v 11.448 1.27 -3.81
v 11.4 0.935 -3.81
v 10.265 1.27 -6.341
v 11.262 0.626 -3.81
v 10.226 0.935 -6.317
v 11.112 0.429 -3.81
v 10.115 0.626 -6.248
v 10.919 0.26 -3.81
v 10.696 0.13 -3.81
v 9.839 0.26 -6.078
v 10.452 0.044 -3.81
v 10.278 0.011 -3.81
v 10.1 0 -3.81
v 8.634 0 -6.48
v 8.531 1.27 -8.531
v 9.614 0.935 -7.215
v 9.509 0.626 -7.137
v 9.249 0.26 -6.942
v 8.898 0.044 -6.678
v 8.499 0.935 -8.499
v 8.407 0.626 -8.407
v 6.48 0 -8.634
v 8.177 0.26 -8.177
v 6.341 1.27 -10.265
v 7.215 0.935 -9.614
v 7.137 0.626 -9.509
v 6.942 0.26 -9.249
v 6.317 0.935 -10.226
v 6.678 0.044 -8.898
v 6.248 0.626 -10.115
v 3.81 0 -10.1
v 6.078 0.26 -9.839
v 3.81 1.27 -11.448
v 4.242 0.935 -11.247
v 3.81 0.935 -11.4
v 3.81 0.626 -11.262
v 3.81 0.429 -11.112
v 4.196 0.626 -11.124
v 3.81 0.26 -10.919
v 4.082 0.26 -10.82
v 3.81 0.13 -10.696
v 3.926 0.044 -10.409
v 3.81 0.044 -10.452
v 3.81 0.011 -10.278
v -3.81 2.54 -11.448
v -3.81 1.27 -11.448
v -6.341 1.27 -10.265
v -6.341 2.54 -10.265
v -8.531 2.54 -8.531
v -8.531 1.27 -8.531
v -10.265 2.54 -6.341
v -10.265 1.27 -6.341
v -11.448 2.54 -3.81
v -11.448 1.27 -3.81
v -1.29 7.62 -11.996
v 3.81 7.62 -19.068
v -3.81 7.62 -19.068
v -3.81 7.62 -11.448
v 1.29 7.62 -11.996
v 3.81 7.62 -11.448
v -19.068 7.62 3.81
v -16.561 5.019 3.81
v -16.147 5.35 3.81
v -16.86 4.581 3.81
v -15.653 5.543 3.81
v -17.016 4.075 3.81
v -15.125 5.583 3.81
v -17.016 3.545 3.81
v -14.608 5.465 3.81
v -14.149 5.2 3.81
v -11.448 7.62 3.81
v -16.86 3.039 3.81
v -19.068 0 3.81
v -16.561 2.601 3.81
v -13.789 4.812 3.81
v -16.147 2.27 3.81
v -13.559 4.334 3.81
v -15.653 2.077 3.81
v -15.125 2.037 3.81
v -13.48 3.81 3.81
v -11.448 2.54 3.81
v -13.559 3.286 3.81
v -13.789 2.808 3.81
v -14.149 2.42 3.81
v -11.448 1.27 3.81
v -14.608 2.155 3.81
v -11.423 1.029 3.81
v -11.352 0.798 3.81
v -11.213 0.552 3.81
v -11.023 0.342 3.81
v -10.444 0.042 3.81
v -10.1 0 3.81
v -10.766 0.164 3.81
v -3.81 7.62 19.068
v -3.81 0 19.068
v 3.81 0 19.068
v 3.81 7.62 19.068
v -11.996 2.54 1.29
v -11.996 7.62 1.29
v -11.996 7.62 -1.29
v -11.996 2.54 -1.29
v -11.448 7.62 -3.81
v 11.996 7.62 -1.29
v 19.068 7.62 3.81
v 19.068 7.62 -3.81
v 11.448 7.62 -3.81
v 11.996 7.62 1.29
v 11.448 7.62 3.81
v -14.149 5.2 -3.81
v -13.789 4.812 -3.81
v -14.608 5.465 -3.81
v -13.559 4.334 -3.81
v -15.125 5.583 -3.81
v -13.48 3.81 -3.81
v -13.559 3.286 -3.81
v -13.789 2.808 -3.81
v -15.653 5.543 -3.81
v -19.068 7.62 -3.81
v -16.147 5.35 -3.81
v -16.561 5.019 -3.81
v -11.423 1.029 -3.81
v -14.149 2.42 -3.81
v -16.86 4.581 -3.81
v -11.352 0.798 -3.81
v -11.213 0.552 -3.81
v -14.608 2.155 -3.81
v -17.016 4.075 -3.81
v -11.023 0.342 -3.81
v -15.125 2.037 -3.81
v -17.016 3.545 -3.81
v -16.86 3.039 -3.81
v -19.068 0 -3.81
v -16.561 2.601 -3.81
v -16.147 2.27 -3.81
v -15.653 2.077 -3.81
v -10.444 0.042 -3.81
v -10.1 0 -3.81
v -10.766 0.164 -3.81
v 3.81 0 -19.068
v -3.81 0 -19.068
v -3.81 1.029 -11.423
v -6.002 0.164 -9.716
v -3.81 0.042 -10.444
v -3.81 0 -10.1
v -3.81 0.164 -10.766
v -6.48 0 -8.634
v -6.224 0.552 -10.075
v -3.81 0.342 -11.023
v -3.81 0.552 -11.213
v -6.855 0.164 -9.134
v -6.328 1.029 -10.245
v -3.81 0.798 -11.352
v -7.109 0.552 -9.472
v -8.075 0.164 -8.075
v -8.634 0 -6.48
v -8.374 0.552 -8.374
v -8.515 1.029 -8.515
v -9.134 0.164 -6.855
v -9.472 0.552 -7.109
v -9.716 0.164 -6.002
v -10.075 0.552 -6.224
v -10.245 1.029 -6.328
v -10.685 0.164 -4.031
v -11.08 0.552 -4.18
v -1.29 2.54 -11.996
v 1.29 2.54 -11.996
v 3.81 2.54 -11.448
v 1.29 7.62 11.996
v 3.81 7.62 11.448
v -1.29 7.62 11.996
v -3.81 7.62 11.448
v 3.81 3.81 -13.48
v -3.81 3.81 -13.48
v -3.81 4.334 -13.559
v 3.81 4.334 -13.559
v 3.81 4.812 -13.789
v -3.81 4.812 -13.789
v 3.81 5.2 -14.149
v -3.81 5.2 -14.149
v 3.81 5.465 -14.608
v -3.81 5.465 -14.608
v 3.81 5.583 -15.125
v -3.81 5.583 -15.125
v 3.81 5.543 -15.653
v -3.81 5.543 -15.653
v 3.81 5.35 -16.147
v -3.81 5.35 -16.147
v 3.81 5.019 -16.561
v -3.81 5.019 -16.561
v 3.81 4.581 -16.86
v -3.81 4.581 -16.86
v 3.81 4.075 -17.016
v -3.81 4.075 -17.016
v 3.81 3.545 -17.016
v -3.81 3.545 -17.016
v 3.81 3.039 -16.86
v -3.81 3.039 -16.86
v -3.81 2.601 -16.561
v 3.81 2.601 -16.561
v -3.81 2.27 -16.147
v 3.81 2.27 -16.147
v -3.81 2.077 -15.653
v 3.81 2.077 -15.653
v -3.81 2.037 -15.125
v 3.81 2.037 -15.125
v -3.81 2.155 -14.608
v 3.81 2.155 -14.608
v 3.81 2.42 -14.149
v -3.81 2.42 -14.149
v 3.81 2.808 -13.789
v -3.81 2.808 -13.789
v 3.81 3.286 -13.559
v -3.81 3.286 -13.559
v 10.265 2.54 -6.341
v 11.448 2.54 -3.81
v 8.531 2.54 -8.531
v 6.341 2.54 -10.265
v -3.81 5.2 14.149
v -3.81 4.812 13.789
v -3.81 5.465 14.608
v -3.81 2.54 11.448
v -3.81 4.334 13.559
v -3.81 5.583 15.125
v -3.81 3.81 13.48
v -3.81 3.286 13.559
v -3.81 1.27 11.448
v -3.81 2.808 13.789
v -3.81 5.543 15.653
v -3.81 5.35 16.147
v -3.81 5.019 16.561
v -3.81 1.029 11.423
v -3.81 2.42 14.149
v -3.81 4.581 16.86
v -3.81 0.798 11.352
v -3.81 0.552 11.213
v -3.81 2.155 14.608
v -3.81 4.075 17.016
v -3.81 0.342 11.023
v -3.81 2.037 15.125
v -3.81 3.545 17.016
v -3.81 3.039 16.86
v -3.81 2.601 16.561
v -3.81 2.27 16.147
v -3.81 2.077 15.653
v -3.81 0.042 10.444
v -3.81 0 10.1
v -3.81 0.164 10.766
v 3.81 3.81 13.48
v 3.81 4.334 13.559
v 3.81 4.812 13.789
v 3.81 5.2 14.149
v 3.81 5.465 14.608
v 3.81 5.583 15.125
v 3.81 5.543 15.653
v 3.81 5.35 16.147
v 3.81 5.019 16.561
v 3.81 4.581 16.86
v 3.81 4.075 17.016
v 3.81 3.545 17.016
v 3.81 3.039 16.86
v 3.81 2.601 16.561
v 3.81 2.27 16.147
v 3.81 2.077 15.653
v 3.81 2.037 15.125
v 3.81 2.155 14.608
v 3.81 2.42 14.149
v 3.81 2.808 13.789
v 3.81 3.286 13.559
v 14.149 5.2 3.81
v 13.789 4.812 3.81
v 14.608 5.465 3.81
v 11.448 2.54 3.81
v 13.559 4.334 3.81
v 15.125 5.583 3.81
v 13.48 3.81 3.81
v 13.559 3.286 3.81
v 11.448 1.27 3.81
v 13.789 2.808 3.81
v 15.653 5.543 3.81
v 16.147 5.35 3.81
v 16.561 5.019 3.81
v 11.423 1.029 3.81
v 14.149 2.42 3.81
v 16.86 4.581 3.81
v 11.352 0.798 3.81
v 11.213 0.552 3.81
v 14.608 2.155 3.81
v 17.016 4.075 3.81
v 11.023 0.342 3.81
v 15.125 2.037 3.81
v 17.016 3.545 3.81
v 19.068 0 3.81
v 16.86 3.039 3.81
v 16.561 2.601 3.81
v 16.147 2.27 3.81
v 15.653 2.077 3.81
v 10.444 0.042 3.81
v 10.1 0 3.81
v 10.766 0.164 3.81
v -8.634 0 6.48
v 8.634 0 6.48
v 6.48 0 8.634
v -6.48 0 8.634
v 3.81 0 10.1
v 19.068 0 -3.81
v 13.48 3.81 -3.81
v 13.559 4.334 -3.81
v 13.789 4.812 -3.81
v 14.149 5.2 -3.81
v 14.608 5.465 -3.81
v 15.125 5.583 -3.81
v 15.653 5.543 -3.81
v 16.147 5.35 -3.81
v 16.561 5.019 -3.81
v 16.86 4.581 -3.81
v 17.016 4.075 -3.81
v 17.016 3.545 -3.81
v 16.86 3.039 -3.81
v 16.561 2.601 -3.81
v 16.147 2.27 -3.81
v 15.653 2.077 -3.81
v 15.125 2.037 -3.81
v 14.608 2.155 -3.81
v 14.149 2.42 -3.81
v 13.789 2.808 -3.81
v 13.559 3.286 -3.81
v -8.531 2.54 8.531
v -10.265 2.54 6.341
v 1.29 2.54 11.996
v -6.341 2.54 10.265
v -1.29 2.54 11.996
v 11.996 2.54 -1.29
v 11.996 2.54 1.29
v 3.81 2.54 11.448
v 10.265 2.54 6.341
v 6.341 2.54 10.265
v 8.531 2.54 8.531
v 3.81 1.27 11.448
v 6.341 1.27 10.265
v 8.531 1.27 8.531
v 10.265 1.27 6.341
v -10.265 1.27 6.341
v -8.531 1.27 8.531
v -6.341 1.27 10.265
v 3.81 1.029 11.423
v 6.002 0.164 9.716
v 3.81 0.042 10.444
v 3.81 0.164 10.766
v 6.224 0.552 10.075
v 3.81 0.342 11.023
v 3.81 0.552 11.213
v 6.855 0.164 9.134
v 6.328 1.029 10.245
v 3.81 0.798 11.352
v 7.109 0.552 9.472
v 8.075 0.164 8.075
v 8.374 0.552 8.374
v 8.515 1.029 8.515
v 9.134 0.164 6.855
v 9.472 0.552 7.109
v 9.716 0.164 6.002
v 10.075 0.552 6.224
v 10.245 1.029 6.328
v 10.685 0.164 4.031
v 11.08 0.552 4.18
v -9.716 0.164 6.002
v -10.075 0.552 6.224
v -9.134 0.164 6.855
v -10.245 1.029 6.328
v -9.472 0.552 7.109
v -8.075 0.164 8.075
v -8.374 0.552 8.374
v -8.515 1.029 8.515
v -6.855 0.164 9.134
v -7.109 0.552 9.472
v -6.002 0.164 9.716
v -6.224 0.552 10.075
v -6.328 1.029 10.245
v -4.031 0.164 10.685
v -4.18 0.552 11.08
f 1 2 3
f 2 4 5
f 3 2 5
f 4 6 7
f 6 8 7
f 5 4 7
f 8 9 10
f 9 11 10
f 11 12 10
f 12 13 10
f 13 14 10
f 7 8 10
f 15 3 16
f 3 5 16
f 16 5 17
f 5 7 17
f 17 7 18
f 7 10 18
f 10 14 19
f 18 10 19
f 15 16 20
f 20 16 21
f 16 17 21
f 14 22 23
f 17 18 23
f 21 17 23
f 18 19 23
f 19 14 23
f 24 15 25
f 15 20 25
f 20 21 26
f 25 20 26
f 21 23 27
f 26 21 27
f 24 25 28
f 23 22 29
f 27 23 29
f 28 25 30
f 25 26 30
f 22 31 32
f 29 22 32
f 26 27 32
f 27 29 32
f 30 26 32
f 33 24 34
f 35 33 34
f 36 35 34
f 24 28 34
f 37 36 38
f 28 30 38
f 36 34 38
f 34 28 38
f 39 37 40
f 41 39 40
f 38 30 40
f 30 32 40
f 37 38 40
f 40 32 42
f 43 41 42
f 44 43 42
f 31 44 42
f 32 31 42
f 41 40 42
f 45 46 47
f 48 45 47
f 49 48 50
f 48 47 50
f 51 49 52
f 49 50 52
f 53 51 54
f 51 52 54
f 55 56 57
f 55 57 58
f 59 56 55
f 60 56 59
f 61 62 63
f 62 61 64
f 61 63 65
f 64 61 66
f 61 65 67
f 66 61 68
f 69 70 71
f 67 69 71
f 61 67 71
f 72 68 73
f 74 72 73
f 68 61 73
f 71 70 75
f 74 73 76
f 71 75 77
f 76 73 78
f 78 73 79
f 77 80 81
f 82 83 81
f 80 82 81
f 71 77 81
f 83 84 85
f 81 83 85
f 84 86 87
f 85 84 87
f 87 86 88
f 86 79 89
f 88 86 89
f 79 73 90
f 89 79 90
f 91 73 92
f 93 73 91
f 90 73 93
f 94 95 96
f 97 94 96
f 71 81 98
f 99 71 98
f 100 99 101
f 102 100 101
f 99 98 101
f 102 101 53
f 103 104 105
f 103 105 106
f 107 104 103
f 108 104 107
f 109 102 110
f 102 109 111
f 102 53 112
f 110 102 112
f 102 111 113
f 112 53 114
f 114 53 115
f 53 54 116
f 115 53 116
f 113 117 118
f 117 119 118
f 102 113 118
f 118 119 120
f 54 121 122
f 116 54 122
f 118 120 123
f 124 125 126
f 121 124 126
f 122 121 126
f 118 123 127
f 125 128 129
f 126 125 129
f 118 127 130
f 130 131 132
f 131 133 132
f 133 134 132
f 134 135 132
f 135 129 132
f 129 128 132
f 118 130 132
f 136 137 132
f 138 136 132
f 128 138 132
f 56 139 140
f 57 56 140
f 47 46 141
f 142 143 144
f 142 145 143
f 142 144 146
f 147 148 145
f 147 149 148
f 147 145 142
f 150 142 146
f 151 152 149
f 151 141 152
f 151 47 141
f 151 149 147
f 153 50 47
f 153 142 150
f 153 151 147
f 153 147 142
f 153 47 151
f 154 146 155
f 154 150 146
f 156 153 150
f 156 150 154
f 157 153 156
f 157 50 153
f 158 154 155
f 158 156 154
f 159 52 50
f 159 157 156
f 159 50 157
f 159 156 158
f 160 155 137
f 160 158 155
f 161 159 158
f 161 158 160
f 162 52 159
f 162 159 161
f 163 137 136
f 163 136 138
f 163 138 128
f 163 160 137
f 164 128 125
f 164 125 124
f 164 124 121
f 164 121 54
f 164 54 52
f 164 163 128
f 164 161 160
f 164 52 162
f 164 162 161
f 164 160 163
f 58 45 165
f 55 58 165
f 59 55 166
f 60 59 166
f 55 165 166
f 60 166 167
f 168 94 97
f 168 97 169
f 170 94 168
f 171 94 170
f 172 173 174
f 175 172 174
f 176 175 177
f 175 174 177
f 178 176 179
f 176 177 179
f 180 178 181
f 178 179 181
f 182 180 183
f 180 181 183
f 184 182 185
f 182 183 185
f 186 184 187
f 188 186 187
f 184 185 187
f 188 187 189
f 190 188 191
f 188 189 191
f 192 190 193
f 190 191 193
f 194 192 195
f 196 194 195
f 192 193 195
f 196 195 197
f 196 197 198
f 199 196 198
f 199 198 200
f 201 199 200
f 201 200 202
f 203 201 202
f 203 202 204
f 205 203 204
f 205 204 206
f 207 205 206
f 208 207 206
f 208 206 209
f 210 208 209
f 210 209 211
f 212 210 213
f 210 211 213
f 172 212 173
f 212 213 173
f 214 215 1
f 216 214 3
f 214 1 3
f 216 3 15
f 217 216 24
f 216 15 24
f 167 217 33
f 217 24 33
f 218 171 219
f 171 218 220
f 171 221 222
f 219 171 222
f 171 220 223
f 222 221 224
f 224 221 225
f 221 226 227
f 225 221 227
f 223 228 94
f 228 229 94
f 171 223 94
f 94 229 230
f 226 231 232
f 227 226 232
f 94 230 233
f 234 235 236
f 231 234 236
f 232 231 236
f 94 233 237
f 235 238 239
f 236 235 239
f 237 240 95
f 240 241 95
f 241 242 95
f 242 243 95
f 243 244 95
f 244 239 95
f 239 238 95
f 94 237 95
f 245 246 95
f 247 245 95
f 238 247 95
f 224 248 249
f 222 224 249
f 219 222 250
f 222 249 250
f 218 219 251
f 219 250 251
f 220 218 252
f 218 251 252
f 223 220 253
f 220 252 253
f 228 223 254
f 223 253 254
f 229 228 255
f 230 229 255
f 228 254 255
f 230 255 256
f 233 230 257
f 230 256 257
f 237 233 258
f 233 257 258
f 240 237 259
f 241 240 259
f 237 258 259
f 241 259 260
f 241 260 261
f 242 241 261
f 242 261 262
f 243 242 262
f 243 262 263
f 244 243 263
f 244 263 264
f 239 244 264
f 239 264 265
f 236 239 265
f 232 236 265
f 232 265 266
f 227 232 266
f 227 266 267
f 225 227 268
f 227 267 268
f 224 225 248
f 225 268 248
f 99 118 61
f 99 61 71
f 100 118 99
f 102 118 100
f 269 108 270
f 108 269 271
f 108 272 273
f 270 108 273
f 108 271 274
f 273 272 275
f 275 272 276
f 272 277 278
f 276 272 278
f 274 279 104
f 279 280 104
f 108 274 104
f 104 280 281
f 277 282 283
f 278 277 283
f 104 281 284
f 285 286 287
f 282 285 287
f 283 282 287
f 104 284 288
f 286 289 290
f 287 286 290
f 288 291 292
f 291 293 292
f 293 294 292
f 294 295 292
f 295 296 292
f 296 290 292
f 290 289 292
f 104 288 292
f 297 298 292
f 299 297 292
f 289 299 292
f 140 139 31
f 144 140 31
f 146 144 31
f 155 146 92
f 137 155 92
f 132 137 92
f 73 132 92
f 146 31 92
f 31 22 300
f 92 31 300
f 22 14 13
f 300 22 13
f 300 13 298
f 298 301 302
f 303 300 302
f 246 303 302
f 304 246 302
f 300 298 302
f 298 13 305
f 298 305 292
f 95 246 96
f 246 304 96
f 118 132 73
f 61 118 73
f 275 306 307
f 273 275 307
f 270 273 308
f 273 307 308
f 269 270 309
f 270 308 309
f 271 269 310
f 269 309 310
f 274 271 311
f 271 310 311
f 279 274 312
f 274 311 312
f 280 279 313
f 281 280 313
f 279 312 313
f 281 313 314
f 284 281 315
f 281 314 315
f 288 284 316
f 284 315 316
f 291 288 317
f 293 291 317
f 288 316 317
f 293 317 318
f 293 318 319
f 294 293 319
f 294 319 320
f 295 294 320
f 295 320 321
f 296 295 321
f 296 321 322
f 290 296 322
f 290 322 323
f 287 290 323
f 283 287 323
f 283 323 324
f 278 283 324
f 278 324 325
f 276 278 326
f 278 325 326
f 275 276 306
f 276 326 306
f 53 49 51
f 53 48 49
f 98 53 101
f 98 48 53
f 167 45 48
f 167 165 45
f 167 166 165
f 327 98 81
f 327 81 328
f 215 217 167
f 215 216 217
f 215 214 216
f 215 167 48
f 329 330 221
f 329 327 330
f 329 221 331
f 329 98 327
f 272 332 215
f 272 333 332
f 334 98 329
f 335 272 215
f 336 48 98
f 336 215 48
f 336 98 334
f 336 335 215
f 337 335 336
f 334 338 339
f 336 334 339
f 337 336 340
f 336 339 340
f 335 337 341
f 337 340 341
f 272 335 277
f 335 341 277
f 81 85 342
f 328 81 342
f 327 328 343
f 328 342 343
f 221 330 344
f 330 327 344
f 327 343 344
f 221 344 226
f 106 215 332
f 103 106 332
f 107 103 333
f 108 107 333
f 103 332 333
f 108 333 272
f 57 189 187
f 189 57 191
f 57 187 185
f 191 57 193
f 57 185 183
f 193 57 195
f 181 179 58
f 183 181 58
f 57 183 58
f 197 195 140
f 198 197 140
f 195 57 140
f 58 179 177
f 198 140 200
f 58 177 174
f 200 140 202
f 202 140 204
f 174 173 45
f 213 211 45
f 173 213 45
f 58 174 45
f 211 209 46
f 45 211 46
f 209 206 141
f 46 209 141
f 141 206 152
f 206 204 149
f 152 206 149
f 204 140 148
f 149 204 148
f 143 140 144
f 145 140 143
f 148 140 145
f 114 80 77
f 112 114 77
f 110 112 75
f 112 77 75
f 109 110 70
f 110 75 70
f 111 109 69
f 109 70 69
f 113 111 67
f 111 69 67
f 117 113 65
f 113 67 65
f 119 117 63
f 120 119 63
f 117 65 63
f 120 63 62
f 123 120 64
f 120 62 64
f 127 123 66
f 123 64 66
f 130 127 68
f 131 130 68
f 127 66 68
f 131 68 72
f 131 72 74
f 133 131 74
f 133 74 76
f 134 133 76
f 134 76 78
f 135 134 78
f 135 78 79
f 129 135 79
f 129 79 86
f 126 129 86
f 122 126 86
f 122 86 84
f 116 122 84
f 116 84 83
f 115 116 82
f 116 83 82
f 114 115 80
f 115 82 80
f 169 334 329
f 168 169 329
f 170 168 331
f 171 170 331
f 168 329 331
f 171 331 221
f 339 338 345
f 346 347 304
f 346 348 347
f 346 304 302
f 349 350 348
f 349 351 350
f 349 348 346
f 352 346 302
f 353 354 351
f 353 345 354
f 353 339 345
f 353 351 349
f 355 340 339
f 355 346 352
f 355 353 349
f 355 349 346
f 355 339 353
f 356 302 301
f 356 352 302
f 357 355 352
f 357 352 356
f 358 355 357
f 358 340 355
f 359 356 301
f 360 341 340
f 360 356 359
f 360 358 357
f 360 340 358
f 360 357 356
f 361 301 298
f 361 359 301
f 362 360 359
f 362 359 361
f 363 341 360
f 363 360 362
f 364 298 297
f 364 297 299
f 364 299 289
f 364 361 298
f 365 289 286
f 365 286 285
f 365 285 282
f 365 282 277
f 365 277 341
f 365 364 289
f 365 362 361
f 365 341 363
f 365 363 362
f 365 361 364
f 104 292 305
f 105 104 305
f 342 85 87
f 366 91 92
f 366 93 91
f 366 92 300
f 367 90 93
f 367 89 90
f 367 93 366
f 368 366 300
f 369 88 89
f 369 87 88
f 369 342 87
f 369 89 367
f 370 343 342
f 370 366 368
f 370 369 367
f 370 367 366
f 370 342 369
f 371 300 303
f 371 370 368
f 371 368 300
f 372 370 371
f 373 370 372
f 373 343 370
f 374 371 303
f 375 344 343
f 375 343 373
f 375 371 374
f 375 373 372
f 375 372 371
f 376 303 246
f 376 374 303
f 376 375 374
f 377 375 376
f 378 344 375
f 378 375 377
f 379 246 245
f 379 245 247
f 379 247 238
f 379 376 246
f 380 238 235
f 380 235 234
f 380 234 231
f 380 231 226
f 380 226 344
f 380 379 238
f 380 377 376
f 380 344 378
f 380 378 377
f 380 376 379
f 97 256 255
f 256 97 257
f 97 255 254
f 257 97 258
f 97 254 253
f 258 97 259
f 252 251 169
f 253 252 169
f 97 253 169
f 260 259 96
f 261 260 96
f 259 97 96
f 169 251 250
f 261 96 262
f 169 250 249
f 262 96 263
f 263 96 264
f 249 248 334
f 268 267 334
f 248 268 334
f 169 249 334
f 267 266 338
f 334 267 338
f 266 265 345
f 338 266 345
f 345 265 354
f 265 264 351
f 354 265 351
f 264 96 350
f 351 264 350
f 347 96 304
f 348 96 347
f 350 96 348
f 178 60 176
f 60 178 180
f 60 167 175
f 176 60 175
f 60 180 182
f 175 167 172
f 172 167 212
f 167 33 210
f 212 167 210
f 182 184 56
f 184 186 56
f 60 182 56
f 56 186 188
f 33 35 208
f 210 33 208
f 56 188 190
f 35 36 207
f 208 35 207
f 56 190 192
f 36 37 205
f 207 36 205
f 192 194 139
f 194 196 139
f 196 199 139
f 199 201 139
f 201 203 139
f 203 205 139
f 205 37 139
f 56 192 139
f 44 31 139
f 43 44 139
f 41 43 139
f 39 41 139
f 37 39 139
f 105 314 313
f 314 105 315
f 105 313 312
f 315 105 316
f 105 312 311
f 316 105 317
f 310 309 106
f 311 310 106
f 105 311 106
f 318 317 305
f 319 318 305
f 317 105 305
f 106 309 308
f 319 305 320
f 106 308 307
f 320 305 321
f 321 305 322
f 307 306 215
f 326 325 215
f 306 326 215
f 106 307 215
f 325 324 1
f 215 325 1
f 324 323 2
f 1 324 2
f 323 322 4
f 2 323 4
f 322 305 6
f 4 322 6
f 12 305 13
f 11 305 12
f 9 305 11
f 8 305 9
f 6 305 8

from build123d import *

# Parameters (mm, degrees)
SKETCH2_R           = 12.065
BOSS_EXTRUDE1_DEPTH = 2.54
BOSS_EXTRUDE2_DEPTH = 7.62
CIRPATTERN1_COUNT   = 4
SKETCH4_R           = 1.778
CUT_EXTRUDE1_DEPTH  = 7.62
CIRPATTERN2_COUNT   = 4
FILLET1_R           = 1.27


with BuildPart() as part:
    # Sketch2 → Boss-Extrude1 (new body)
    with BuildSketch(Plane(origin=(0, 0, 0), x_dir=(1, 0, 0), z_dir=(0, 1, 0))):
        with Locations(Location((0, 0, 0), (0, 0, 270))):
            Circle(SKETCH2_R)
    extrude(amount=BOSS_EXTRUDE1_DEPTH)

    # Sketch3 → Boss-Extrude2 (add)
    with BuildSketch(Plane(origin=(0, 0, 0), x_dir=(1, 0, 0), z_dir=(0, 1, 0))):
        with BuildLine():
            Line((-11.4476253, 3.81), (-19.0676253, 3.81))
            Line((-19.0676253, 3.81), (-19.0676253, -3.81))
            Line((-19.0676253, -3.81), (-11.4476253, -3.81))
            ThreePointArc((-11.4476253, -3.81), (-12.065, 0), (-11.4476253, 3.81))
        make_face()
    boss_extrude2 = extrude(amount=BOSS_EXTRUDE2_DEPTH)

    # CirPattern1: Boss-Extrude2 ×4 about axis
    cirpattern1_axis = Axis((0, 0, 0), (0, 1, 0))
    for i in range(1, CIRPATTERN1_COUNT):
        add(boss_extrude2.rotate(cirpattern1_axis, i * 360 / CIRPATTERN1_COUNT))

    # Sketch4 → Cut-Extrude1 (cut)
    with BuildSketch(Plane.XY.offset(3.81)):
        with Locations((-15.2576253, 3.81)):
            Circle(SKETCH4_R)
    cut_extrude1 = extrude(amount=-CUT_EXTRUDE1_DEPTH, mode=Mode.SUBTRACT)

    # CirPattern2: Cut-Extrude1 ×4 about axis
    cirpattern2_axis = Axis((0, 2.54, 0), (0, -1, 0))
    for i in range(1, CIRPATTERN2_COUNT):
        add(cut_extrude1.rotate(cirpattern2_axis, i * 360 / CIRPATTERN2_COUNT), mode=Mode.SUBTRACT)

    # Fillet1
    fillet1_edges = [part.edges().sort_by_distance(p)[0] for p in [
        (8.531243315, 0, 8.531243315),
        (8.531243315, 0, -8.531243315),
        (-8.531243315, 0, -8.531243315),
        (-8.531243315, 0, 8.531243315),
    ]]
    fillet(fillet1_edges, radius=FILLET1_R)


solid = part.part
